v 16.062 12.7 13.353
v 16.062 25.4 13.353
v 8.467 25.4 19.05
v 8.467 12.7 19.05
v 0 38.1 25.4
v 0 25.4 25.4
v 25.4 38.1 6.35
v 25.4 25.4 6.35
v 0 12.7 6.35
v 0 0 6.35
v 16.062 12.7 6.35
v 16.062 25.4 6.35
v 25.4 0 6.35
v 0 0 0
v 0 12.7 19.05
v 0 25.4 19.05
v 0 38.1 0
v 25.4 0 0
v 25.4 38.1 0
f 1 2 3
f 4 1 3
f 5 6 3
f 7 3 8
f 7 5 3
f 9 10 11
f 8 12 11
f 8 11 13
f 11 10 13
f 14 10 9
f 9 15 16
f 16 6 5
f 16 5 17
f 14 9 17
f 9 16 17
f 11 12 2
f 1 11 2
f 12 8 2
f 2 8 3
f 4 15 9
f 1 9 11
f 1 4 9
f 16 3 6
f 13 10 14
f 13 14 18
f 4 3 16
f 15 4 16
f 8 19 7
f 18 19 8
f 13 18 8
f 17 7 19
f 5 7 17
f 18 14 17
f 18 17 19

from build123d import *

# Parameters (mm, degrees)
F0_W     = 25.4
F0_H     = 6.35
F1_DEPTH = 38.1
F3_DEPTH = 12.7
F5_DEPTH = 12.7


with BuildPart() as f1:
    # F0 (on Front) → F1 (new body)
    with BuildSketch(Plane.XZ):
        with Locations((12.7, 3.175)):
            Rectangle(F0_W, F0_H)
    extrude(amount=-F1_DEPTH)

    # F2 (on face) → F3 (join)
    with BuildSketch(Plane(origin=(0, 38.1, 0), x_dir=(-1, 0, 0), z_dir=(0, 1, 0))):
        Polygon((-25.4, 6.35), (0, 6.35), (0, 25.4), align=None)
    extrude(amount=-F3_DEPTH)

    # F4 (on face) → F5 (join)
    with BuildSketch(Plane.XZ.offset(-25.4)):
        Polygon((0, 19.05), (0, 6.35), (16.062235, 6.35), (16.062235, 13.353323), (8.466667, 19.05), align=None)
    extrude(amount=F5_DEPTH)


solid = f1.part
